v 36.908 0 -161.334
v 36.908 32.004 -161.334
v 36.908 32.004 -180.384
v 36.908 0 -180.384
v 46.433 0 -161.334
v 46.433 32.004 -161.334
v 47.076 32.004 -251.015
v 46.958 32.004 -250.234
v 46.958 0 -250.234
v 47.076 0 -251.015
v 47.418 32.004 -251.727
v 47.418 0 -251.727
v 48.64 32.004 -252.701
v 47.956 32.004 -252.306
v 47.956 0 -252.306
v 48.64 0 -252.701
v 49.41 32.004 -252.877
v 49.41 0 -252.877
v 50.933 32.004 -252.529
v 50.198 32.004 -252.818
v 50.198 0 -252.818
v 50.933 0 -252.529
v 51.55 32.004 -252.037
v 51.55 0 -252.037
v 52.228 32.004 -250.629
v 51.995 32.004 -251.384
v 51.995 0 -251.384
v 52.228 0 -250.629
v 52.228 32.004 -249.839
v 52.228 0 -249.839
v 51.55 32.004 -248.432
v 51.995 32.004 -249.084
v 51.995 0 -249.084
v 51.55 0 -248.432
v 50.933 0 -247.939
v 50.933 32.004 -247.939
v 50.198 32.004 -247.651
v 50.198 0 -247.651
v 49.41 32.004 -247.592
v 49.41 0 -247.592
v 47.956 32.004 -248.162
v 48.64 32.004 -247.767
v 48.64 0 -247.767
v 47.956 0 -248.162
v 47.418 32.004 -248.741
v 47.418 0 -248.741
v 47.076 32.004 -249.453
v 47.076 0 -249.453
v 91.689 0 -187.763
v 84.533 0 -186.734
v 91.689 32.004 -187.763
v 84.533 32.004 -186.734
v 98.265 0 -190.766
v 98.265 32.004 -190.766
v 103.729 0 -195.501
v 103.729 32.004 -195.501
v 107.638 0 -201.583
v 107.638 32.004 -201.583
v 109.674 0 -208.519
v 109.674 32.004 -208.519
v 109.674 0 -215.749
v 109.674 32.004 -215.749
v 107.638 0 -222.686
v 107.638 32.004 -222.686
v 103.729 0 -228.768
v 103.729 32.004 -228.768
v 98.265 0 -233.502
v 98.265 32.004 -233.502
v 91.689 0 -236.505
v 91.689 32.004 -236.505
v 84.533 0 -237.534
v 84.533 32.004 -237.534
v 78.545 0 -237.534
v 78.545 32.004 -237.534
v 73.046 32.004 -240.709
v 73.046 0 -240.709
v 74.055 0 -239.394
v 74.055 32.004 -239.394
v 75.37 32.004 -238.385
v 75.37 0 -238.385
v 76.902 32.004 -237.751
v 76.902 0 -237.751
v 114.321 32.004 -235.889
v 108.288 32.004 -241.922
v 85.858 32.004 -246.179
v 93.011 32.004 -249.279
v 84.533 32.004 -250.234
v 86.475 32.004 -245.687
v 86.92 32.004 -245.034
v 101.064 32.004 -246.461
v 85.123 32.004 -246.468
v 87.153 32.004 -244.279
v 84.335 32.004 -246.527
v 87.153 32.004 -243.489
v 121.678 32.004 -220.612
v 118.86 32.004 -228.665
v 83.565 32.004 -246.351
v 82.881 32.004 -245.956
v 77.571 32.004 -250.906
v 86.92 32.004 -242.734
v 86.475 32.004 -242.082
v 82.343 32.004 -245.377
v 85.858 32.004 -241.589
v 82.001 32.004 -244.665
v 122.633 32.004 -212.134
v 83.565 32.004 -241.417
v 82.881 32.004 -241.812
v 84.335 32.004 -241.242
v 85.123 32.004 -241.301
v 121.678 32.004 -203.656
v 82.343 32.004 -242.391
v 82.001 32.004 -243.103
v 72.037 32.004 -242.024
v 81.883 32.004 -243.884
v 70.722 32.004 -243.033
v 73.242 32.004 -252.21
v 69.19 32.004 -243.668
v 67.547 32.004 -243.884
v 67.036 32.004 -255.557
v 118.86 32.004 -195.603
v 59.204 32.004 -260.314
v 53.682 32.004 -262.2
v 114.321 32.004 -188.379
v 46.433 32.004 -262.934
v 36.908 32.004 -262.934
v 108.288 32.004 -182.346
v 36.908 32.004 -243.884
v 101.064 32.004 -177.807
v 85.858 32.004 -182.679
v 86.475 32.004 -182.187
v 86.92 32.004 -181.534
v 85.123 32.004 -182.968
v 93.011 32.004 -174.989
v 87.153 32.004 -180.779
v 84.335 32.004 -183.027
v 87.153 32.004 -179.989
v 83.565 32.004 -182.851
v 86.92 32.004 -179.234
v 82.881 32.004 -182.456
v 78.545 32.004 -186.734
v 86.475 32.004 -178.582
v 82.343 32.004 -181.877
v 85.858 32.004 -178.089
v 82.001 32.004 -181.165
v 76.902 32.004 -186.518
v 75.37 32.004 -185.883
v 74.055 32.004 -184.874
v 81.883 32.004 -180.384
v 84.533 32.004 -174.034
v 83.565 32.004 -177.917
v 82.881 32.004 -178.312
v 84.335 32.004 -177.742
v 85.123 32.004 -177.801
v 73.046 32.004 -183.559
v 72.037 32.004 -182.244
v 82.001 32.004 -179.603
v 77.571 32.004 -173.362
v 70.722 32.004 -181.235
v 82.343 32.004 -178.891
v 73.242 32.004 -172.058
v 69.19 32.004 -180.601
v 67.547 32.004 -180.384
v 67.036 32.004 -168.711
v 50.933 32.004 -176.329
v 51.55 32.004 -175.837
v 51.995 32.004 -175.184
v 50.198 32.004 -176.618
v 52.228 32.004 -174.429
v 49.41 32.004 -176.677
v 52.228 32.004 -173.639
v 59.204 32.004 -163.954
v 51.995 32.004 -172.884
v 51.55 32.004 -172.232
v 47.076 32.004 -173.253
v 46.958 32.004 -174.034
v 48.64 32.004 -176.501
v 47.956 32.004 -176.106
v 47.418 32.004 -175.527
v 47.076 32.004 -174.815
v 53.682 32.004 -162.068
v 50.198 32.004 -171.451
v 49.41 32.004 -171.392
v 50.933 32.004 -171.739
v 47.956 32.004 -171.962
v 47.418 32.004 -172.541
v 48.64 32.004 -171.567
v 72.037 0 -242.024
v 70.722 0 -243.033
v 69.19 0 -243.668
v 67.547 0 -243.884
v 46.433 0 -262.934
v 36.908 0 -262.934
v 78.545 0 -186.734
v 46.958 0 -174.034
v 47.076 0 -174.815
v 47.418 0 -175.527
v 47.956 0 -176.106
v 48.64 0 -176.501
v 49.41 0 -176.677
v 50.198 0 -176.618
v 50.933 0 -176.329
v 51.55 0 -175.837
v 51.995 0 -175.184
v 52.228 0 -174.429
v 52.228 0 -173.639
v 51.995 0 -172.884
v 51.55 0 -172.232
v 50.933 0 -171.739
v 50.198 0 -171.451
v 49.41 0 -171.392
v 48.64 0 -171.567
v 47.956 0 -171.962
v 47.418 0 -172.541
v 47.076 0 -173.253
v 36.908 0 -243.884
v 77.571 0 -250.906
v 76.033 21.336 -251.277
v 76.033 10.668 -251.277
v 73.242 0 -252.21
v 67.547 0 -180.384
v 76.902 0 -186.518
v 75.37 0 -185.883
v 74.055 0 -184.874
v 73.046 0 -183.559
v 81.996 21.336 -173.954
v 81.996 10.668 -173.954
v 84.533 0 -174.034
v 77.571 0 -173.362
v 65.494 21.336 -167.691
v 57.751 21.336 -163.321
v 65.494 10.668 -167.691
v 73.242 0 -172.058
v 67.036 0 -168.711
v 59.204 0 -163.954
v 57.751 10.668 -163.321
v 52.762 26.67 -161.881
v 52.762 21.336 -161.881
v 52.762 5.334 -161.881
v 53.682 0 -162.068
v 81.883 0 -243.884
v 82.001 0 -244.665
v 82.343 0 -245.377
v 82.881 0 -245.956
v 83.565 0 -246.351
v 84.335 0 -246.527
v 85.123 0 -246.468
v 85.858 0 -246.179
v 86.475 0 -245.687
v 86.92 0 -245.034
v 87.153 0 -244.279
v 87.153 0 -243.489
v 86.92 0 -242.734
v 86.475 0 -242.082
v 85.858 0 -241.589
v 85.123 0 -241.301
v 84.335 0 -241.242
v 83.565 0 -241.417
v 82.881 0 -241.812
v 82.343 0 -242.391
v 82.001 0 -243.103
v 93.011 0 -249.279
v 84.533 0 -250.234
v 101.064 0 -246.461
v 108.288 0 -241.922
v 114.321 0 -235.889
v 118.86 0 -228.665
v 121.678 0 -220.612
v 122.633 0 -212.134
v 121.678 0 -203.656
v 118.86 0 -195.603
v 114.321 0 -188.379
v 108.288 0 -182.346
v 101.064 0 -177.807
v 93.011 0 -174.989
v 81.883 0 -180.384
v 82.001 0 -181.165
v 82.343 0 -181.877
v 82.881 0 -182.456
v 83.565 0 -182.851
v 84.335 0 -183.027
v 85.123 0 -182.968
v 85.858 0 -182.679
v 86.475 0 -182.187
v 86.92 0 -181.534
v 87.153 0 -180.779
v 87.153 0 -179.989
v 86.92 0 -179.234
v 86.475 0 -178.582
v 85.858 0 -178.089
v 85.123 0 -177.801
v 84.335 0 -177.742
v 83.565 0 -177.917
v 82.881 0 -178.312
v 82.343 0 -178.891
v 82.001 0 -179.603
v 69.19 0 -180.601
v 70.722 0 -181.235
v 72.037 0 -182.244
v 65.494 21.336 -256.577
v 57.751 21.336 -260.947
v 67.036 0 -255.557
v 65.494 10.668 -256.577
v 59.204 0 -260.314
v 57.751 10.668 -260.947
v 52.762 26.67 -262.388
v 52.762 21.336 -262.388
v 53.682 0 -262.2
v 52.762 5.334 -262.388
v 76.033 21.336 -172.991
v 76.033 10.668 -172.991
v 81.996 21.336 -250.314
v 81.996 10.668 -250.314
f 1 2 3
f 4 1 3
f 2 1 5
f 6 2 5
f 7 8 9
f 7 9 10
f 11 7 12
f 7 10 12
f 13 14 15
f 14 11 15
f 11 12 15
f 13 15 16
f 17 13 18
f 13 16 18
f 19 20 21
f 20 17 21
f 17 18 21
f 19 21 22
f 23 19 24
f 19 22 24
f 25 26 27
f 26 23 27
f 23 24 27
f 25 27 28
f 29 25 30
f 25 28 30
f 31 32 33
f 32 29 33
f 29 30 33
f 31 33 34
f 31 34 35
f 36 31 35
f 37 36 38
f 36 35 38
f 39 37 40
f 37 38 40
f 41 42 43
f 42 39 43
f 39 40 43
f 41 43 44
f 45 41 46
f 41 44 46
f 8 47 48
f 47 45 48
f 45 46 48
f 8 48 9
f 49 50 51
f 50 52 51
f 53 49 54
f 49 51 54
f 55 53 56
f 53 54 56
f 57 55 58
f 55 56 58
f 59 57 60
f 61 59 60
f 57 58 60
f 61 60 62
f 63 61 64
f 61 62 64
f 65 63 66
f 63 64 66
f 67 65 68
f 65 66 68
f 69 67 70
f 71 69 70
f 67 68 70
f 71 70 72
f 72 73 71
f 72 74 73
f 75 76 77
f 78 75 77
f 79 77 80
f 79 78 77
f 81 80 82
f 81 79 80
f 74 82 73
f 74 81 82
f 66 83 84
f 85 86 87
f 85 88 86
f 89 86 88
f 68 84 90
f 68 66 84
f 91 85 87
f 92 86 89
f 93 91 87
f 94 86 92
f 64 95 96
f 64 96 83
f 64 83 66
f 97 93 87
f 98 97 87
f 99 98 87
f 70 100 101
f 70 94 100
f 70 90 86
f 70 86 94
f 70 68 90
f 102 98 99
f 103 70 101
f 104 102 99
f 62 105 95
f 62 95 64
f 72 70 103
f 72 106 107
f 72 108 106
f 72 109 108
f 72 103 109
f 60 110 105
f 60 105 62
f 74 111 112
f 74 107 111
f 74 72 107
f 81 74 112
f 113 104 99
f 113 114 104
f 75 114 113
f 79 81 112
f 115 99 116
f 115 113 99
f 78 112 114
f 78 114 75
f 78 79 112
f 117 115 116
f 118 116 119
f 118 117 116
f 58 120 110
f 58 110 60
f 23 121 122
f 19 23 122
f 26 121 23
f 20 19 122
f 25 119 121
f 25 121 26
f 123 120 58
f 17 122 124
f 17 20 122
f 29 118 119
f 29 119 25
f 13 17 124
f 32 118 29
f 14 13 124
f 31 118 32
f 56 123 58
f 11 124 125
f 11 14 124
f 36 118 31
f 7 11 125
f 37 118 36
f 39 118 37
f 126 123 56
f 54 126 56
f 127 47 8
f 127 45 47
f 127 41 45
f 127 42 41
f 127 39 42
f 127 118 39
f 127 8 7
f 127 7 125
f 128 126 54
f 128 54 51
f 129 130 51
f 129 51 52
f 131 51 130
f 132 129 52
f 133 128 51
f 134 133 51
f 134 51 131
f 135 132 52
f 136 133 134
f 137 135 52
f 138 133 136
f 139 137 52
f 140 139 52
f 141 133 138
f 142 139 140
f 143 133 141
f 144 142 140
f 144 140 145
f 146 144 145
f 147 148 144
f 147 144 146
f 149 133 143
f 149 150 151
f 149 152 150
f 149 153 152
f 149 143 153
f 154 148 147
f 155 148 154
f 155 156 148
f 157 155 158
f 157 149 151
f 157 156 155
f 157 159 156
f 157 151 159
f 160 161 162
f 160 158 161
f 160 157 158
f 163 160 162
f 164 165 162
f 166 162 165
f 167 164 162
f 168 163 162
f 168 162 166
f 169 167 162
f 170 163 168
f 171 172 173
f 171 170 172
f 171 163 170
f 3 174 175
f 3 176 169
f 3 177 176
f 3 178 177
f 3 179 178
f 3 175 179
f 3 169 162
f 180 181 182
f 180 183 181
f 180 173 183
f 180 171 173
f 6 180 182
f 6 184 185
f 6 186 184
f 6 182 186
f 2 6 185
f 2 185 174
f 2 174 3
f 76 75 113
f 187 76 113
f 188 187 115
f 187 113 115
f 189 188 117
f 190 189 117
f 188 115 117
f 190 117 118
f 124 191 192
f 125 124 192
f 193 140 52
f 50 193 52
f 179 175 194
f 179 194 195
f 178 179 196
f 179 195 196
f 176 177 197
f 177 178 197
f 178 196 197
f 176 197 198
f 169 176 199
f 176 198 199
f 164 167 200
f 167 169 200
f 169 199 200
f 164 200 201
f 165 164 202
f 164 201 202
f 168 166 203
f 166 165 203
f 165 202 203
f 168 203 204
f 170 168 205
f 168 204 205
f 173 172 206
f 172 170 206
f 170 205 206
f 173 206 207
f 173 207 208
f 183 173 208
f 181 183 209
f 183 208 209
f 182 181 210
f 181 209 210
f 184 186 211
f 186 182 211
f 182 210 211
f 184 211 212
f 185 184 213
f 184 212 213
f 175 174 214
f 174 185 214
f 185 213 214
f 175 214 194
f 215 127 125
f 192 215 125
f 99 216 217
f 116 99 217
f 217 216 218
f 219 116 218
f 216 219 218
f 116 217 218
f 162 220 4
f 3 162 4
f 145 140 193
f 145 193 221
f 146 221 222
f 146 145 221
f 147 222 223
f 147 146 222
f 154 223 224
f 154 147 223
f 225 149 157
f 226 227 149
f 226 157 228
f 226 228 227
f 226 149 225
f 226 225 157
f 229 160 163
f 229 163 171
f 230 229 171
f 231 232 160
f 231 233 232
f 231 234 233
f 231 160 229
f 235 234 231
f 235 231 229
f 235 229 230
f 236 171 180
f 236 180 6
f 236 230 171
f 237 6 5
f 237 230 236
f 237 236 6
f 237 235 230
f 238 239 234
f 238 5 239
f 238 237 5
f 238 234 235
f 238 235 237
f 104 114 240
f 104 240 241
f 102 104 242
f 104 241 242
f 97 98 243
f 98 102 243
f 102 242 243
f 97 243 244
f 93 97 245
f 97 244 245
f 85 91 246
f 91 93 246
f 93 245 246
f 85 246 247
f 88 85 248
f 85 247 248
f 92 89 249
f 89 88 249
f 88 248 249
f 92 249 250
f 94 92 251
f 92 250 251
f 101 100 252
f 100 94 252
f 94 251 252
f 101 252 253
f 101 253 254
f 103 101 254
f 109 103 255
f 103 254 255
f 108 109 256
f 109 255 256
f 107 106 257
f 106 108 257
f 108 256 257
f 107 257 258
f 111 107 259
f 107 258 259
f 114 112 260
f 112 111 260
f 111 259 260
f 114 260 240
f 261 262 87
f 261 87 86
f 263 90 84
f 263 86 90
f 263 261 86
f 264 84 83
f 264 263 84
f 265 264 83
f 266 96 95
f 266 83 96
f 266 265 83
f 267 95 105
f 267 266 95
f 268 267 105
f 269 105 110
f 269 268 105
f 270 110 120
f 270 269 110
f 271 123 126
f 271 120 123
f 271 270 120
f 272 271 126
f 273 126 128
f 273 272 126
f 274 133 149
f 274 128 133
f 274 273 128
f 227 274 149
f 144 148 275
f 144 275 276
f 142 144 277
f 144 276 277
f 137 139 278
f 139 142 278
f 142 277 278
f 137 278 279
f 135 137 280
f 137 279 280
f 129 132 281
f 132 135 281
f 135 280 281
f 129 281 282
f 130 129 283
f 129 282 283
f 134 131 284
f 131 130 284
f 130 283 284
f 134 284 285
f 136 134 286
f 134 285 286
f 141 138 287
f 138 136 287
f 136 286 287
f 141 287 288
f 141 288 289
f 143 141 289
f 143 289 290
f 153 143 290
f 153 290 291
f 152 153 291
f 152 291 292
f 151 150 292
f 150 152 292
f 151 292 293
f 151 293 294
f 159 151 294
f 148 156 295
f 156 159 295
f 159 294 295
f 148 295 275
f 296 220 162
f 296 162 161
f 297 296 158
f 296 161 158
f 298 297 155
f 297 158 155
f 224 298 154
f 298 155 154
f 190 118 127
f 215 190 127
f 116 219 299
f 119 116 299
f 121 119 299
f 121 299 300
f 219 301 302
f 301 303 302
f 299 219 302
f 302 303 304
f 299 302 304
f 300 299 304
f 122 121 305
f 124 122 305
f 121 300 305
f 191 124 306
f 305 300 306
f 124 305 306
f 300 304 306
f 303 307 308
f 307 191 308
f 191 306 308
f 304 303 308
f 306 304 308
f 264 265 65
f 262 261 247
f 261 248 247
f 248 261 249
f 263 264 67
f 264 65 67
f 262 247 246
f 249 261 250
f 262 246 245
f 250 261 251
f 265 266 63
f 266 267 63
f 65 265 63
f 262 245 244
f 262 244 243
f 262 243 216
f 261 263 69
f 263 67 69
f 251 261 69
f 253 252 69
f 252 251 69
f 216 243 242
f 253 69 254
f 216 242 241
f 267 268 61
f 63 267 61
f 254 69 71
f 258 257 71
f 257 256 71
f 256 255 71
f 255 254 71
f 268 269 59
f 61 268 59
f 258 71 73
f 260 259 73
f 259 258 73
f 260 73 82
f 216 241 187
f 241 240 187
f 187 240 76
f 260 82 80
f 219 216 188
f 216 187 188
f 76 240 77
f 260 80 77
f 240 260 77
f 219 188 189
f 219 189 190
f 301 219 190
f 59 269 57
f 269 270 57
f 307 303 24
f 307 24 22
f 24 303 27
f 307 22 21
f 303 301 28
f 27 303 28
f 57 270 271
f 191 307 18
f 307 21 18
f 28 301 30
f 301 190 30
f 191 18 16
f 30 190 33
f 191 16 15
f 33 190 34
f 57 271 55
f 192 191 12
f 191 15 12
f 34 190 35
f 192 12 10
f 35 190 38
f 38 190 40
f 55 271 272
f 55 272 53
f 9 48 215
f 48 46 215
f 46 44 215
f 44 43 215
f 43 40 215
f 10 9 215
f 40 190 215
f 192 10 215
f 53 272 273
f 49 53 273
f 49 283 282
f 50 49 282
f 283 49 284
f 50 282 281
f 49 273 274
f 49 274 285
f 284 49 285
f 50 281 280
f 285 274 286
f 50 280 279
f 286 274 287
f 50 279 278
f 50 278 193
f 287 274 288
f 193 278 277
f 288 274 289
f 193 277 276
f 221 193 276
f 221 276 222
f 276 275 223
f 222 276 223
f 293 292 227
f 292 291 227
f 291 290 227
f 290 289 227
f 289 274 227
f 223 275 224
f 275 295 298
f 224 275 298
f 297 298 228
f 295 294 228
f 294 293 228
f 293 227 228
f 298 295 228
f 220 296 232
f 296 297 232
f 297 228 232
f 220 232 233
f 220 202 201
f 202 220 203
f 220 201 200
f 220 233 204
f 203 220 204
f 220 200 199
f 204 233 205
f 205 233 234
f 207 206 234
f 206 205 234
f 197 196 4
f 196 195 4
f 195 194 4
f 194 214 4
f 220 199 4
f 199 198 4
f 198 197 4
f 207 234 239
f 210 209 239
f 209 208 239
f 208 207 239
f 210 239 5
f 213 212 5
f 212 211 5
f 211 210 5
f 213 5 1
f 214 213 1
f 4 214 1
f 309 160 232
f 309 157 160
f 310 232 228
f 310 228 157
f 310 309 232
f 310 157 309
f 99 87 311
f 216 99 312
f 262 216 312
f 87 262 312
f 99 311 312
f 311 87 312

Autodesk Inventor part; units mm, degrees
ref_plane "YZ Plane" through (0, 0, 0) normal (1, 0, 0) x (0, 1, 0)
ref_plane "XZ Plane" through (0, 0, 0) normal (0, 1, 0) x (-1, 0, 0)
ref_plane "XY Plane" through (0, 0, 0) normal (0, 0, 1) x (1, 0, 0)
sketch "Sketch1" plane through (0, 0, 0) normal (0, 1, 0) x (-1, 0, 0)
  line L0 (99.4671, -212.1342) -> (-395.7488, 283.0816) construction
  circle A0 centre (-24.2079, -174.0342) radius 2.65
  circle A1 centre (-21.0329, -212.1342) radius 6.35
  circle A2 centre (1.1921, -174.0342) radius 2.65
  circle A3 centre (10.7171, -212.1342) radius 14.2875
  circle A4 centre (26.5921, -174.0342) radius 2.65
  line L1 (-84.5329, -212.1342) -> (10.7171, -212.1342) construction
  line L2 (39.2921, -161.3342) -> (-113.1079, -161.3342)
  line L3 (-113.1079, -262.9342) -> (39.2921, -262.9342)
  circle A5 centre (-49.6079, -174.0342) radius 2.65
  circle A6 centre (-52.7829, -212.1342) radius 6.35
  circle A7 centre (-75.0079, -174.0342) radius 2.65
  circle A8 centre (-75.0079, -250.2342) radius 2.65
  circle A9 centre (-84.5329, -212.1342) radius 14.2875
  circle A10 centre (-100.4079, -174.0342) radius 2.65
  circle A11 centre (-100.4079, -250.2342) radius 2.65
  circle A12 centre (-49.6079, -250.2342) radius 2.65
  circle A13 centre (1.1921, -250.2342) radius 2.65
  circle A14 centre (26.5921, -250.2342) radius 2.65
  circle A15 centre (-24.2079, -250.2342) radius 2.65
  line L4 (39.2921, -262.9342) -> (39.2921, -161.3342)
  line L5 (39.2921, -237.5342) -> (395.5271, -237.5342)
  line L6 (74.0671, -186.7342) -> (39.2921, -186.7342)
  line L7 (-113.1079, -161.3342) -> (-113.1079, -262.9342)
  spline S0 degree 3 poles (-84.5329, -174.0342) (-65.4829, -174.0342) (-65.4829, -161.3342) (-46.4329, -161.3342) knots 1 1 1 1 2 2 2 2
  line L8 (-84.5329, -174.0342) -> (-65.4829, -174.0342) construction
  line L9 (-65.4829, -174.0342) -> (-65.4829, -161.3342) construction
  line L10 (-65.4829, -161.3342) -> (-46.4329, -161.3342) construction
  circle A16 centre (-84.5329, -212.1342) radius 38.1
  circle A17 centre (-84.5329, -180.3842) radius 2.65
  spline S1 degree 3 poles (-84.5329, -250.2342) (-65.4829, -250.2342) (-65.4829, -262.9342) (-46.4329, -262.9342) knots 1 1 1 1 2 2 2 2
  line L11 (-84.5329, -250.2342) -> (-65.4829, -250.2342) construction
  line L12 (-65.4829, -250.2342) -> (-65.4829, -262.9342) construction
  line L13 (-65.4829, -262.9342) -> (-46.4329, -262.9342) construction
  circle A18 centre (-84.5329, -243.8842) radius 2.65
  point P0 (0, 0)
  point P1 (-36.9079, -262.9342)
  point P2 (-36.9079, -212.1342)
  point P3 (39.2921, -212.1342)
  point P4 (-46.4329, -262.9342)
  point P5 (-46.4329, -161.3342)
  dimension "d0" = 31.75
extrude "Extrusion1" add sketch "Sketch1" along normal blind 32.004 contours L4 L3 S1 A8 A16 A7 S0 L2 | A7 A16 S0 | A16 A7 A8 L7 | L7 A16 | A7 A16 S0 | A7 A16 | A16 A8 S1 | S1 A8 A16 | A8 A16
sketch "Sketch2" plane through (0, 32.004, 0) normal (0, 1, 0) x (1, 0, 0)
  circle A0 centre (49.6079, 174.0342) radius 2.65 projected
  circle A1 centre (49.6079, 174.0342) radius 2.65
  line L0 (49.6079, 174.0342) -> (36.9079, 174.0342)
  line L1 (-39.2921, 161.3342) -> (46.4329, 161.3342) projected
  line L2 (36.9079, 161.3342) -> (36.9079, 271.4653)
  line L3 (36.9079, 271.4653) -> (-75.2217, 284.061)
  line L4 (-75.2217, 284.061) -> (-39.9967, 13.0358)
  line L5 (-39.9967, 13.0358) -> (36.9079, 161.3342)
  point P0 (0, 0)
  dimension "d3" = 12.7
extrude "Extrusion2" cut sketch "Sketch2" against normal through all contours L2 L5 L4 L3
sketch "Sketch3" plane through (0, 32.004, 0) normal (0, 1, 0) x (1, 0, 0)
  line L0 (26.0555, 454.6039) -> (26.0555, 378.7664)
  line L1 (26.0555, 454.6039) -> (26.0555, 378.7664)
  arc A0 (38.7555, 340.6664) -> (114.9555, 340.6664) centre (76.8555, 340.6664) ccw
  circle A1 centre (76.8555, 340.6664) radius 38.1
  line L2 (26.0555, 378.7664) -> (45.1055, 378.7664)
  line L3 (45.1055, 357.6525) -> (45.1055, 454.6039)
  arc A2 (51.4555, 340.6664) -> (102.2555, 340.6664) centre (76.8555, 340.6664) ccw
  line L4 (45.1055, 378.7664) -> (51.4555, 378.7664)
  line L5 (51.4555, 346.6539) -> (51.4555, 340.6664)
  line L6 (45.1055, 353.0039) -> (45.1055, 353.0039)
  arc A3 (51.4555, 346.6539) -> (48.2805, 352.1532) centre (45.1055, 346.6539) ccw
  arc A4 (45.1055, 357.6525) -> (48.2805, 352.1532) centre (51.4555, 357.6525) ccw
  line L7 (108.6055, 357.6525) -> (108.6055, 454.6039)
  arc A5 (105.4305, 352.1532) -> (102.2555, 346.6539) centre (108.6055, 346.6539) ccw
  arc A6 (105.4305, 352.1532) -> (108.6055, 357.6525) centre (102.2555, 357.6525) ccw
  line L8 (102.2555, 346.6539) -> (102.2555, 340.6664)
  line L9 (127.6555, 378.7664) -> (127.6555, 454.8164)
  line L10 (127.6555, 454.8164) -> (127.6555, 337.8192)
  spline S0 degree 3 poles (26.0555, 378.7664) (26.0555, 359.7164) (38.7555, 359.7164) (38.7555, 340.6664) knots 1 1 1 1 2 2 2 2
  line L11 (26.0555, 378.7664) -> (26.0555, 359.7164) construction
  line L12 (26.0555, 359.7164) -> (38.7555, 359.7164) construction
  line L13 (38.7555, 359.7164) -> (38.7555, 340.6664) construction
  line L14 (76.8555, 340.6664) -> (76.8555, 373.056)
  spline S1 degree 3 poles (127.6555, 378.7664) (127.6555, 359.7164) (114.9555, 359.7164) (114.9555, 340.6664) knots 1 1 1 1 2 2 2 2
  line L15 (127.6555, 378.7664) -> (127.6555, 359.7164) construction
  line L16 (127.6555, 359.7164) -> (114.9555, 359.7164) construction
  line L17 (114.9555, 359.7164) -> (114.9555, 340.6664) construction
  circle A7 centre (38.7555, 400.9914) radius 2.65
  circle A8 centre (38.7555, 400.9914) radius 2.65
  circle A9 centre (38.7555, 375.5914) radius 2.65
  circle A10 centre (38.7555, 375.5914) radius 2.65
  circle A11 centre (45.1055, 340.6664) radius 2.65
  circle A12 centre (45.1055, 340.6664) radius 2.65
  circle A13 centre (108.6055, 340.6664) radius 2.65
  circle A14 centre (108.6055, 340.6664) radius 2.65
  circle A15 centre (114.9555, 375.5914) radius 2.65
  circle A16 centre (114.9555, 375.5914) radius 2.65
  circle A17 centre (114.9555, 400.9914) radius 2.65
  circle A18 centre (114.9555, 400.9914) radius 2.65
  circle A19 centre (76.8555, 308.9164) radius 2.65
  circle A20 centre (76.8555, 308.9164) radius 2.65
  line L18 (70.868, 315.2664) -> (76.8555, 315.2664)
  arc A21 (70.868, 315.2664) -> (65.3687, 312.0914) centre (70.868, 308.9164) ccw
  line L19 (64.518, 308.9164) -> (64.518, 308.9164)
  arc A22 (59.8694, 308.9164) -> (65.3687, 312.0914) centre (59.8694, 315.2664) ccw
  line L20 (57.8055, 302.5664) -> (76.8555, 302.5664) construction
  spline S2 degree 3 poles (38.7555, 289.8664) (57.8055, 289.8664) (57.8055, 302.5664) (76.8555, 302.5664) knots 1 1 1 1 2 2 2 2
  line L21 (38.7555, 289.8664) -> (57.8055, 289.8664) construction
  line L22 (57.8055, 289.8664) -> (57.8055, 302.5664) construction
  line L23 (38.7555, 308.9164) -> (38.7555, 315.2664)
  line L24 (38.7555, 289.8664) -> (38.7555, 308.9164)
  circle A23 centre (41.9305, 302.5664) radius 2.65
  line L25 (-37.082, 289.8664) -> (38.7555, 289.8664)
  line L26 (-37.082, 289.8664) -> (38.7555, 289.8664)
  line L27 (59.8694, 308.9164) -> (-37.082, 308.9164)
  line L28 (59.8694, 372.4164) -> (-37.082, 372.4164)
  circle A24 centre (16.5305, 378.7664) radius 2.65
  circle A25 centre (16.5305, 378.7664) radius 2.65
  line L29 (-37.2945, 391.4664) -> (79.7027, 391.4664)
  line L30 (38.7555, 391.4664) -> (-37.2945, 391.4664)
  circle A26 centre (16.5305, 302.5664) radius 2.65
  circle A27 centre (16.5305, 302.5664) radius 2.65
  circle A28 centre (41.9305, 302.5664) radius 2.65
  circle A29 centre (41.9305, 378.7664) radius 2.65
  circle A30 centre (41.9305, 378.7664) radius 2.65
  line L31 (38.7555, 391.4664) -> (57.8055, 391.4664) construction
  spline S3 degree 3 poles (38.7555, 391.4664) (57.8055, 391.4664) (57.8055, 378.7664) (76.8555, 378.7664) knots 1 1 1 1 2 2 2 2
  line L32 (57.8055, 391.4664) -> (57.8055, 378.7664) construction
  line L33 (57.8055, 378.7664) -> (76.8555, 378.7664) construction
  arc A31 (65.3687, 369.2414) -> (59.8694, 372.4164) centre (59.8694, 366.0664) ccw
  arc A32 (65.3687, 369.2414) -> (70.868, 366.0664) centre (70.868, 372.4164) ccw
  line L34 (70.868, 366.0664) -> (76.8555, 366.0664)
  circle A33 centre (76.8555, 372.4164) radius 2.65
  circle A34 centre (76.8555, 372.4164) radius 2.65
  arc A35 (76.8555, 302.5664) -> (76.8555, 378.7664) centre (76.8555, 340.6664) ccw
  circle A36 centre (76.8555, 340.6664) radius 38.1
  line L35 (76.8555, 340.6664) -> (44.4659, 340.6664)
  arc A37 (76.8555, 315.2664) -> (76.8555, 366.0664) centre (76.8555, 340.6664) ccw
  circle A38 centre (84.5329, 212.1342) radius 14.2875 projected
  circle A39 centre (84.5329, 212.1342) radius 14.2875
  circle A40 centre (52.7829, 212.1342) radius 2.65
  circle A41 centre (52.7829, 212.1342) radius 2.65
  line L36 (59.1329, 218.1218) -> (59.1329, 212.1342)
  arc A42 (59.1329, 218.1218) -> (55.9579, 223.6211) centre (52.7829, 218.1218) ccw
  line L37 (52.7829, 224.4718) -> (52.7829, 224.4718)
  arc A43 (52.7829, 229.1203) -> (55.9579, 223.6211) centre (59.1329, 229.1203) ccw
  line L38 (46.4329, 231.1842) -> (46.4329, 212.1342) construction
  spline S4 degree 3 poles (33.7329, 250.2342) (33.7329, 231.1842) (46.4329, 231.1842) (46.4329, 212.1342) knots 1 1 1 1 2 2 2 2
  line L39 (33.7329, 250.2342) -> (33.7329, 231.1842) construction
  line L40 (33.7329, 231.1842) -> (46.4329, 231.1842) construction
  line L41 (52.7829, 250.2342) -> (59.1329, 250.2342)
  line L42 (33.7329, 250.2342) -> (52.7829, 250.2342)
  circle A44 centre (46.4329, 247.0592) radius 2.65
  line L43 (33.7329, 326.0718) -> (33.7329, 250.2342)
  line L44 (33.7329, 326.0718) -> (33.7329, 250.2342)
  line L45 (52.7829, 229.1203) -> (52.7829, 326.0718)
  line L46 (116.2829, 229.1203) -> (116.2829, 326.0718)
  circle A45 centre (122.6329, 272.4592) radius 2.65
  circle A46 centre (122.6329, 272.4592) radius 2.65
  line L47 (135.3329, 326.2842) -> (135.3329, 209.2871)
  line L48 (135.3329, 250.2342) -> (135.3329, 326.2842)
  circle A47 centre (46.4329, 272.4592) radius 2.65
  circle A48 centre (46.4329, 272.4592) radius 2.65
  circle A49 centre (46.4329, 247.0592) radius 2.65
  circle A50 centre (122.6329, 247.0592) radius 2.65
  circle A51 centre (122.6329, 247.0592) radius 2.65
  line L49 (135.3329, 250.2342) -> (135.3329, 231.1842) construction
  spline S5 degree 3 poles (135.3329, 250.2342) (135.3329, 231.1842) (122.6329, 231.1842) (122.6329, 212.1342) knots 1 1 1 1 2 2 2 2
  line L50 (135.3329, 231.1842) -> (122.6329, 231.1842) construction
  line L51 (122.6329, 231.1842) -> (122.6329, 212.1342) construction
  arc A52 (113.1079, 223.6211) -> (116.2829, 229.1203) centre (109.9329, 229.1203) ccw
  arc A53 (113.1079, 223.6211) -> (109.9329, 218.1218) centre (116.2829, 218.1218) ccw
  line L52 (109.9329, 218.1218) -> (109.9329, 212.1342)
  circle A54 centre (116.2829, 212.1342) radius 2.65
  circle A55 centre (116.2829, 212.1342) radius 2.65
  arc A56 (46.4329, 212.1342) -> (122.6329, 212.1342) centre (84.5329, 212.1342) ccw
  circle A57 centre (84.5329, 212.1342) radius 38.1
  line L53 (84.5329, 212.1342) -> (84.5329, 244.5238)
  arc A58 (59.1329, 212.1342) -> (109.9329, 212.1342) centre (84.5329, 212.1342) ccw
  line L54 (78.5454, 237.5342) -> (84.5329, 237.5342)
  arc A59 (73.0461, 240.7092) -> (78.5454, 237.5342) centre (78.5454, 243.8842) ccw
  line L55 (84.5329, 212.1342) -> (52.1434, 212.1342)
  arc A60 (84.5329, 186.7342) -> (84.5329, 237.5342) centre (84.5329, 212.1342) ccw
  circle A61 centre (84.5329, 212.1342) radius 38.1
  arc A62 (84.5329, 174.0342) -> (84.5329, 250.2342) centre (84.5329, 212.1342) ccw
  line L56 (78.5454, 186.7342) -> (84.5329, 186.7342)
  arc A63 (78.5454, 186.7342) -> (73.0461, 183.5592) centre (78.5454, 180.3842) ccw
  line L57 (72.1954, 180.3842) -> (72.1954, 180.3842)
  arc A64 (67.5469, 180.3842) -> (73.0461, 183.5592) centre (67.5469, 186.7342) ccw
  circle A65 centre (84.5329, 180.3842) radius 2.65
  circle A66 centre (84.5329, 180.3842) radius 2.65
  line L58 (65.4829, 174.0342) -> (84.5329, 174.0342) construction
  spline S6 degree 3 poles (46.4329, 161.3342) (65.4829, 161.3342) (65.4829, 174.0342) (84.5329, 174.0342) knots 1 1 1 1 2 2 2 2
  line L59 (46.4329, 161.3342) -> (65.4829, 161.3342) construction
  line L60 (65.4829, 161.3342) -> (65.4829, 174.0342) construction
  line L61 (46.4329, 180.3842) -> (46.4329, 186.7342)
  circle A67 centre (84.5329, 243.8842) radius 2.65
  circle A68 centre (84.5329, 243.8842) radius 2.65
  line L62 (65.4829, 250.2342) -> (84.5329, 250.2342) construction
  spline S7 degree 3 poles (46.4329, 262.9342) (65.4829, 262.9342) (65.4829, 250.2342) (84.5329, 250.2342) knots 1 1 1 1 2 2 2 2
  line L63 (46.4329, 262.9342) -> (65.4829, 262.9342) construction
  line L64 (65.4829, 262.9342) -> (65.4829, 250.2342) construction
  circle A69 centre (49.6079, 250.2342) radius 2.65
  circle A70 centre (49.6079, 250.2342) radius 2.65
  arc A71 (73.0461, 240.7092) -> (67.5469, 243.8842) centre (67.5469, 237.5342) ccw
  line L65 (46.4329, 161.3342) -> (46.4329, 180.3842)
  circle A72 centre (49.6079, 174.0342) radius 2.65
  line L66 (-29.4046, 161.3342) -> (46.4329, 161.3342)
  line L67 (-29.4046, 161.3342) -> (46.4329, 161.3342)
  line L68 (67.5469, 180.3842) -> (-29.4046, 180.3842)
  line L69 (67.5469, 243.8842) -> (-29.4046, 243.8842)
  circle A73 centre (24.2079, 250.2342) radius 2.65
  circle A74 centre (24.2079, 250.2342) radius 2.65
  line L70 (-29.6171, 262.9342) -> (87.3801, 262.9342)
  line L71 (46.4329, 262.9342) -> (-29.6171, 262.9342)
  circle A75 centre (49.6079, 174.0342) radius 2.65
  circle A76 centre (24.2079, 174.0342) radius 2.65
  circle A77 centre (24.2079, 174.0342) radius 2.65
  line L72 (-29.4046, 180.3842) -> (-29.4046, 243.8842)
  point P0 (0, 0)
  point P1 (161.6667, 205.692)
  point P2 (36.9079, 161.3342)
  point P3 (71.58, 306.9082)
  point P4 (46.4329, 161.3342)
  point P5 (110.6137, 335.3909)
  point P6 (79.2575, 178.376)
  point P7 (118.2912, 206.8588)
  dimension "d9" = 19.05
  dimension "d10" = 12.7
  dimension "d11" = 76.2
  dimension "d12" = 101.6
  dimension "d13" = 6.35
  dimension "d14" = 19.05
  dimension "d15" = 19.05
  dimension "d16" = 19.05
  dimension "d17" = 12.7
  dimension "d18" = 76.2
  dimension "d19" = 101.6
  dimension "d20" = 6.35
  dimension "d21" = 19.05
  dimension "d22" = 19.05
  dimension "d23" = 19.05
  dimension "d24" = 12.7
  dimension "d25" = 76.2
  dimension "d26" = 101.6
  dimension "d27" = 6.35
  dimension "d28" = 19.05
  dimension "d29" = 19.05
  dimension "d30" = 19.05
  dimension "d31" = 12.7
  dimension "d32" = 76.2
  dimension "d33" = 101.6
  dimension "d34" = 6.35
  dimension "d35" = 19.05
  dimension "d36" = 19.05
extrude "Extrusion3" cut sketch "Sketch3" against normal through all contours L69 A57 L45 | L45 A57 S4 L69 | L69 A71 A59 L54 L53 A38 L55 L36 A42 A43 L45 A57 | S4 A56 L68 L72 L69 | L45 A43 A42 L36 A58 L56 A63 A64 L68 A56 A57 | A58 L55 A38 L53 A60
properties part number "L1 Gearbox Cover"
